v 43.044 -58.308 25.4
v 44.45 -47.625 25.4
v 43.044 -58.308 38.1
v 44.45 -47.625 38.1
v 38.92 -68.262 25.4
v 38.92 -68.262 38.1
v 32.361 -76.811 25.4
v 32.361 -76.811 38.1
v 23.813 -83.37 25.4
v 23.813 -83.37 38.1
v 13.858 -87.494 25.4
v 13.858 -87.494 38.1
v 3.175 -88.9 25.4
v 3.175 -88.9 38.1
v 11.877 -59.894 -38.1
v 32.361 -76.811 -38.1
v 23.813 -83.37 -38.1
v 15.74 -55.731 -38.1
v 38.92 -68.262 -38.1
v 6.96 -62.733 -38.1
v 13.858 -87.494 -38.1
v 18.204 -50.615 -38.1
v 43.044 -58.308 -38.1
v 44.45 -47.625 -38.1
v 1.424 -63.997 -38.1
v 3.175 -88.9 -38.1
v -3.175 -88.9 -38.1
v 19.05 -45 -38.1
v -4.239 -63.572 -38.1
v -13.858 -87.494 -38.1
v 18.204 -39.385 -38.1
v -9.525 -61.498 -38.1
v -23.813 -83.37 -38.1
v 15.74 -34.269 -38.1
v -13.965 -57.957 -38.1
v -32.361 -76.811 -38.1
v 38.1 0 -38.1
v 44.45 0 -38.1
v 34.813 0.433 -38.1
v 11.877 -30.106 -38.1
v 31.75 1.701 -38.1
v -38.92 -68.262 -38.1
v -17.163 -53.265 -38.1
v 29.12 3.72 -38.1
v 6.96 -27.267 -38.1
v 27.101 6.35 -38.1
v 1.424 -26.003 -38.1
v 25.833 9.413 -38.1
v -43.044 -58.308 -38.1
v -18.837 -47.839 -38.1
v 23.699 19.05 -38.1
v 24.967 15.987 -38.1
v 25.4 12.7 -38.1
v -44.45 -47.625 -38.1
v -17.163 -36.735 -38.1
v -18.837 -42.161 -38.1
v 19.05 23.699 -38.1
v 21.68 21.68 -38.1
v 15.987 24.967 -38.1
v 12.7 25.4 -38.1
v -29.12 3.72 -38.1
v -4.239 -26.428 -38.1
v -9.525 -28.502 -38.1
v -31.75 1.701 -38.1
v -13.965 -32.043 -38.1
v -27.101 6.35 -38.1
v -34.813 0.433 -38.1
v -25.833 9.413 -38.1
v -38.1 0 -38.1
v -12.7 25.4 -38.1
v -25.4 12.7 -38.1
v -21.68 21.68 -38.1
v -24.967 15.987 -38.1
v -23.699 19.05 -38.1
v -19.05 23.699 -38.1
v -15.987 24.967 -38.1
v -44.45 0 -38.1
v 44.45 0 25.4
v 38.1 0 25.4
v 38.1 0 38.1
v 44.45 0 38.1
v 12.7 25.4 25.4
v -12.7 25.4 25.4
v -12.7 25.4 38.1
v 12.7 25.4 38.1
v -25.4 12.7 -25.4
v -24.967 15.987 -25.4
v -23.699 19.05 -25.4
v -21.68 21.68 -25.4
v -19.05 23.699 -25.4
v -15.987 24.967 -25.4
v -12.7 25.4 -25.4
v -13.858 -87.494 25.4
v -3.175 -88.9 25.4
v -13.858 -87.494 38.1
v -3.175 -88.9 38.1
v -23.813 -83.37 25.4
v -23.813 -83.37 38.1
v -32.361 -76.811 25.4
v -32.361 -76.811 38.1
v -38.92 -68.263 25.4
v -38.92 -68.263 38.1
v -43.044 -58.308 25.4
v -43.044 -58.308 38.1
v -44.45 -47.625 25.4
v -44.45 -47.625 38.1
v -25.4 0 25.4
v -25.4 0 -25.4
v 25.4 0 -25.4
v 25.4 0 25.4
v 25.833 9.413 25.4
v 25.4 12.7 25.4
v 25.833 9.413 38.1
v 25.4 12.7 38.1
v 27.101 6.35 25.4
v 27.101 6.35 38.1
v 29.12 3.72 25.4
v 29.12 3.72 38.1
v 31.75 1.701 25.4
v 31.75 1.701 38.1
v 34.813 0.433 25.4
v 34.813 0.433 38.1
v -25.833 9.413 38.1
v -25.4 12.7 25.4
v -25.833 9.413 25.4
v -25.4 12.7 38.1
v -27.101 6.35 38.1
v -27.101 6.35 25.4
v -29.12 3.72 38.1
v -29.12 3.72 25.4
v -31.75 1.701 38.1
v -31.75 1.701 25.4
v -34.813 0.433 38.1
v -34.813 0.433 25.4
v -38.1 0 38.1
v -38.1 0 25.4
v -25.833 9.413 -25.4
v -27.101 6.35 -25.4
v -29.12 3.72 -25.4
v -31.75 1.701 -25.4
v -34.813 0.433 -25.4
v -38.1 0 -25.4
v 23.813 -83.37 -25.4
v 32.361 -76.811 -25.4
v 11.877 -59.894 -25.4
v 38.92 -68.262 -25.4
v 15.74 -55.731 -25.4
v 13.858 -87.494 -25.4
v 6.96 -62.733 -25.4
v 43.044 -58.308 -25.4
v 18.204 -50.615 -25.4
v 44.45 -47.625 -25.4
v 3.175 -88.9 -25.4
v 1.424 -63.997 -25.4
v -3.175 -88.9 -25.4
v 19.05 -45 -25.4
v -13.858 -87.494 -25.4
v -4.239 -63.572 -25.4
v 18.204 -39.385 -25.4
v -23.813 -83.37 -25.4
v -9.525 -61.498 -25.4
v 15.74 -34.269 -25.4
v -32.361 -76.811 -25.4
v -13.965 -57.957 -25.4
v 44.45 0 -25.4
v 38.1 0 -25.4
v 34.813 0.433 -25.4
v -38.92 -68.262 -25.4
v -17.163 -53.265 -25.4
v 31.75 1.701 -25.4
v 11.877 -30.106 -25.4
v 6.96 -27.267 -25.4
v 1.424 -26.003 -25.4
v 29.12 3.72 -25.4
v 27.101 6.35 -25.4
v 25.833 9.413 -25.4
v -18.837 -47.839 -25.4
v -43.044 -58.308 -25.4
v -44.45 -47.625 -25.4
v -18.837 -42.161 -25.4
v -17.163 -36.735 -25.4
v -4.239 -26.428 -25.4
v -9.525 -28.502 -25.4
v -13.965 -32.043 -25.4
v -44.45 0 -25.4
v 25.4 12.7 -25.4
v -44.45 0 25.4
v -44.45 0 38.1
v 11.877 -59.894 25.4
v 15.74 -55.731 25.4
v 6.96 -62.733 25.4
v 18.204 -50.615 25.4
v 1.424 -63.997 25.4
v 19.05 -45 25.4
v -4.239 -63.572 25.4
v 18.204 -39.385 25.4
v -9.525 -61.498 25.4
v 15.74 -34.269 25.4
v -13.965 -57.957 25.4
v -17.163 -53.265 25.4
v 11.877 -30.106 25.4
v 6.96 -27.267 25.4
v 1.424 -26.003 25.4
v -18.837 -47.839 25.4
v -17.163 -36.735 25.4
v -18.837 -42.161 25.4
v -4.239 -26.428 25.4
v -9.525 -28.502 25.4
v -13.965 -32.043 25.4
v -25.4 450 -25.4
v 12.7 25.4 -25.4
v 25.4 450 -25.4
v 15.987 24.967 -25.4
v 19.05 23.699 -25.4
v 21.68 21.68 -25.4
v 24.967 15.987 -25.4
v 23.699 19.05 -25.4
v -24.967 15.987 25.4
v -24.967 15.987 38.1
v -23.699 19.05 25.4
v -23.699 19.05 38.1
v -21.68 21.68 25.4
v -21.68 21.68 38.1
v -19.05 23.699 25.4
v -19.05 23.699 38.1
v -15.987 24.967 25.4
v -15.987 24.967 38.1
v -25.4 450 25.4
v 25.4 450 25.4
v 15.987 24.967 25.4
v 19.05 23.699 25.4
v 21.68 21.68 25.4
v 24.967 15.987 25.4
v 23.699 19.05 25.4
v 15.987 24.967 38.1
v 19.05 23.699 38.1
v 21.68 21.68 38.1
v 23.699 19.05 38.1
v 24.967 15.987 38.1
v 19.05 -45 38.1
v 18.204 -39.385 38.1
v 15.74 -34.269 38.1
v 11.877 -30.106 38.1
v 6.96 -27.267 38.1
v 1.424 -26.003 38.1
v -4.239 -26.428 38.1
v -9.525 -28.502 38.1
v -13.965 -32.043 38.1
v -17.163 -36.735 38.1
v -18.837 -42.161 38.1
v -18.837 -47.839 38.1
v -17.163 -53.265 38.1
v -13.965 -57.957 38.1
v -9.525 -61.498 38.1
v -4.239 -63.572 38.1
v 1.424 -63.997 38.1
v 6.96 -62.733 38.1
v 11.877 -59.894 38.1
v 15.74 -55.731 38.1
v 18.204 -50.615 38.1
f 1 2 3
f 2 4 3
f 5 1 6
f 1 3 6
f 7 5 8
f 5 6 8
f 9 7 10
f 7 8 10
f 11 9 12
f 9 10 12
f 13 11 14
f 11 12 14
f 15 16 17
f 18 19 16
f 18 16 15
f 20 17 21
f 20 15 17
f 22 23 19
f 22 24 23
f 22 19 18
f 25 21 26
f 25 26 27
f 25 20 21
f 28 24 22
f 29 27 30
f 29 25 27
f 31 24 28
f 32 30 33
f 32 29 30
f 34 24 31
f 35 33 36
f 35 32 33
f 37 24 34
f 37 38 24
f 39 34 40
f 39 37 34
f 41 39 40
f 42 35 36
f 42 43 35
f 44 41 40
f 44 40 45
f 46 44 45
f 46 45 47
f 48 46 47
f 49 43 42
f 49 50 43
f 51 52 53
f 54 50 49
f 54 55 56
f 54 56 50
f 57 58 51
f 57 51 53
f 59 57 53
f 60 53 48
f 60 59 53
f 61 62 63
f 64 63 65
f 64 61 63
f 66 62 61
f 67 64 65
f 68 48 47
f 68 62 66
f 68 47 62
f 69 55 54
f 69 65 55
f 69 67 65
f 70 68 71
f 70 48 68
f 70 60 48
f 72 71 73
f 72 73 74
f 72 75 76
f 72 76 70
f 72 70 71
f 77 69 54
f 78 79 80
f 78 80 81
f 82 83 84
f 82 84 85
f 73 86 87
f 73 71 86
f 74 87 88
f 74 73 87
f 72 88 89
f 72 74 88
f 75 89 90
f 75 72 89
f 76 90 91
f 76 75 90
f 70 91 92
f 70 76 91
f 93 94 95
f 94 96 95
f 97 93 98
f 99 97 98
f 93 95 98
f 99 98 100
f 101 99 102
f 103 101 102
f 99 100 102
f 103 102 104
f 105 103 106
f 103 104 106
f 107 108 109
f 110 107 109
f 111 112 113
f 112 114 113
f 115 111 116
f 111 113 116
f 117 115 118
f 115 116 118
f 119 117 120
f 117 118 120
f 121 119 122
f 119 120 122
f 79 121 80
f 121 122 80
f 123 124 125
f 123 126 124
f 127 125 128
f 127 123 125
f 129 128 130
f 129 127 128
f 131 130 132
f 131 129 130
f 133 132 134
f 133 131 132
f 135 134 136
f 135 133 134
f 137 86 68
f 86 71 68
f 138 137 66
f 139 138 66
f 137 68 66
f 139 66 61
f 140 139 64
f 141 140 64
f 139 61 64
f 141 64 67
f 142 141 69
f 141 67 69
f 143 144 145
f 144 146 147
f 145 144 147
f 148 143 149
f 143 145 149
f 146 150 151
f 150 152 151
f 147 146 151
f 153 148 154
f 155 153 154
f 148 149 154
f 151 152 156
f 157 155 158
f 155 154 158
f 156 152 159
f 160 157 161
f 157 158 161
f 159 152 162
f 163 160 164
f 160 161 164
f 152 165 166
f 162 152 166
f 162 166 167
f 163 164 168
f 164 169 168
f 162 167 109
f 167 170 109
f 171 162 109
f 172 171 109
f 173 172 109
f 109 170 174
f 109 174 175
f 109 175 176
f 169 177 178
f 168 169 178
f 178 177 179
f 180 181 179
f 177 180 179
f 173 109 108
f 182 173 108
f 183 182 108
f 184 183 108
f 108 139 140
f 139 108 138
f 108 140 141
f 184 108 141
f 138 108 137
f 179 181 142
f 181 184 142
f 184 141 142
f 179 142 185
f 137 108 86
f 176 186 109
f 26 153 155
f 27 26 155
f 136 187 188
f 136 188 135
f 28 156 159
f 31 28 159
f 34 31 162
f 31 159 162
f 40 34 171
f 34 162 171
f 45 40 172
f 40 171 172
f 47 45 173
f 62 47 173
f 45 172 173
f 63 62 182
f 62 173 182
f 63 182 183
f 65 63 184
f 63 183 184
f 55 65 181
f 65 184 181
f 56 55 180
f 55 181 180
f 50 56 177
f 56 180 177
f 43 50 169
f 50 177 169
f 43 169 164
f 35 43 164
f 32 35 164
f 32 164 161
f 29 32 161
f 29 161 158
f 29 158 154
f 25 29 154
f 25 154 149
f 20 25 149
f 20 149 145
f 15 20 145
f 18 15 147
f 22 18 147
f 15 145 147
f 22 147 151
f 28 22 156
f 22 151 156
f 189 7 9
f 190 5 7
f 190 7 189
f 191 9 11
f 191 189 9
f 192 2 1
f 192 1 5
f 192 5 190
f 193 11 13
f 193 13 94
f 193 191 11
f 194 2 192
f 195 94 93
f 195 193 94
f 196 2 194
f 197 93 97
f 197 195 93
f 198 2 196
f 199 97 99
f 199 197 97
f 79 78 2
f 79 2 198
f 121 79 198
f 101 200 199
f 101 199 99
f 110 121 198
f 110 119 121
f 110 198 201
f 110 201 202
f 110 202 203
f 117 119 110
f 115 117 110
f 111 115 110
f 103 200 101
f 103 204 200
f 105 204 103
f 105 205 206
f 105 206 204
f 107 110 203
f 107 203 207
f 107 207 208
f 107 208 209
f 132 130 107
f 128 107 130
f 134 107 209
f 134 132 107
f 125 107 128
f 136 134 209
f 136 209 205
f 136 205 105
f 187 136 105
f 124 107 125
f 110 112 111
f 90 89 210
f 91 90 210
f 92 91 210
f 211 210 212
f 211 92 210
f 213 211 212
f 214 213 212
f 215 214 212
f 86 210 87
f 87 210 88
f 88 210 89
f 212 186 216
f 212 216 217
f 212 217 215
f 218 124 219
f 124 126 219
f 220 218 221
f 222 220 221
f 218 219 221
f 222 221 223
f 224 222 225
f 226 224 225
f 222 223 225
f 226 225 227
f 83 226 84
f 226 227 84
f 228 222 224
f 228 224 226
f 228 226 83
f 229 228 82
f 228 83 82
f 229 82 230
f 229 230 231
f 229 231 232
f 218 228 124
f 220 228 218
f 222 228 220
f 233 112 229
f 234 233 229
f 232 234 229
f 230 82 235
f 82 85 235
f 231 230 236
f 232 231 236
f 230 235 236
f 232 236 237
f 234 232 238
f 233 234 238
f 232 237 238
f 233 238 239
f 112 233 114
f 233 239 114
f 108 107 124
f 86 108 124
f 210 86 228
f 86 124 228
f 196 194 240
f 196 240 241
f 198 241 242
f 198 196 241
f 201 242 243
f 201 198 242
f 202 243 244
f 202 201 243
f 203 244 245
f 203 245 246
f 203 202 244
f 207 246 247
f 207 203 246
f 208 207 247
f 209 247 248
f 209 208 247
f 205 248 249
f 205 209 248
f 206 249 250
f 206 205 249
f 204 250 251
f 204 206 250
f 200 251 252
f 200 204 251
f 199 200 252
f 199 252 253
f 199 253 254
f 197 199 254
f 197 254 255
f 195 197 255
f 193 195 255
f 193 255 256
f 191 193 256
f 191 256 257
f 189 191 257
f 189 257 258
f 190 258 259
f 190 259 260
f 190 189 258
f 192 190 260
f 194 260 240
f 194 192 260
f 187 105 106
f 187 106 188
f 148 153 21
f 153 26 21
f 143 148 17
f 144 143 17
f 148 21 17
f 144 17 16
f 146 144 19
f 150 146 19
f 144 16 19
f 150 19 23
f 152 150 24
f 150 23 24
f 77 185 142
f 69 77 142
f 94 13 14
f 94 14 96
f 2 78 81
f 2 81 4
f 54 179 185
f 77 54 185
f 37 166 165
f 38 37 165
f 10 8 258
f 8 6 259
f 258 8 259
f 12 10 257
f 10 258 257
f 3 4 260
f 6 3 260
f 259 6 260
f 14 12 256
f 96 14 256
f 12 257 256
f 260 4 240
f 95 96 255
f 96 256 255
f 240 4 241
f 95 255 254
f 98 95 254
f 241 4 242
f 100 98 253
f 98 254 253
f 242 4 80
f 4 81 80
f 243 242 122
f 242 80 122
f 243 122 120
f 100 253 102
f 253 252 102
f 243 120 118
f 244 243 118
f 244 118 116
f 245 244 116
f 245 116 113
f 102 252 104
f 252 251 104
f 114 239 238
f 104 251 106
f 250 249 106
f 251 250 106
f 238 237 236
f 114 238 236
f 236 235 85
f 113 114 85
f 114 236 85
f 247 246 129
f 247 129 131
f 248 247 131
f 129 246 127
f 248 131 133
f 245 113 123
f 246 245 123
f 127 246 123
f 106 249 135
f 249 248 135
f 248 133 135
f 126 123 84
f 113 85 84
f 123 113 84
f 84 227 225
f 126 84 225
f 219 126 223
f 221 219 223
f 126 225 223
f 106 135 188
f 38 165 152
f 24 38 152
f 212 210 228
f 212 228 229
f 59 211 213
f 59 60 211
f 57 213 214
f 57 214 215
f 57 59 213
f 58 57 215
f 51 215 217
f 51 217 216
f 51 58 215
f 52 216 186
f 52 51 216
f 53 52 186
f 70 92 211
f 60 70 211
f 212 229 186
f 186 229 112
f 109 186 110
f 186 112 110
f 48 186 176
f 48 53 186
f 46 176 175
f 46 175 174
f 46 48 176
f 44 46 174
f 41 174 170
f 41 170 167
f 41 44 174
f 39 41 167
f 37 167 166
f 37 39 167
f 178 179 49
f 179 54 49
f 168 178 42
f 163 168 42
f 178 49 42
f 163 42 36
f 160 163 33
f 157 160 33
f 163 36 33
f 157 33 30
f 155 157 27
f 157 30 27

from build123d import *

# Parameters (mm, degrees)
SKETCH1_W           = 50.8
SKETCH1_H           = 50.8
BOSS_EXTRUDE1_DEPTH = 450
SKETCH3_R           = 19.05
BOSS_EXTRUDE2_DEPTH = 12.7
FILLET1_R           = 12.7
FILLET3_R           = 41.275


with BuildPart() as part:
    # Sketch1 → Boss-Extrude1 (new body)
    with BuildSketch(Plane(origin=(0, 0, 0), x_dir=(1, 0, 0), z_dir=(0, 1, 0))):
        Rectangle(SKETCH1_W, SKETCH1_H)
    extrude(amount=BOSS_EXTRUDE1_DEPTH)

    # Sketch3 → Boss-Extrude2 (add)
    with BuildSketch(Plane.XY.offset(25.4)):
        Polygon((-25.4, 0), (-25.4, 25.4), (25.4, 25.4), (25.4, 0), (44.45, 0), (44.45, -88.9), (-44.45, -88.9), (-44.45, 0), align=None)
        with Locations((0, -45)):
            Circle(SKETCH3_R, mode=Mode.SUBTRACT)
    boss_extrude2 = extrude(amount=BOSS_EXTRUDE2_DEPTH)

    # Mirror1: Boss-Extrude2 across plane
    add(boss_extrude2.mirror(Plane.XY))

    # Fillet1
    fillet1_edges = [part.edges().sort_by_distance(p)[0] for p in [
        (25.4, 0, 31.75),
        (25.4, 0, -31.75),
        (-25.4, 0, -31.75),
        (-25.4, 0, 31.75),
    ]]
    fillet(fillet1_edges, radius=FILLET1_R)
    fillet1_2_edges = [part.edges().sort_by_distance(p)[0] for p in [
        (25.4, 25.4, -31.75),
        (-25.4, 25.4, -31.75),
        (25.4, 25.4, 31.75),
        (-25.4, 25.4, 31.75),
    ]]
    fillet(fillet1_2_edges, radius=FILLET1_R - 0.0001)  # a hair under: the kernel refuses the full size

    # Fillet3
    fillet3_edges = [part.edges().sort_by_distance(p)[0] for p in [
        (-44.45, -88.9, 31.75),
        (44.45, -88.9, 31.75),
        (-44.45, -88.9, -31.75),
        (44.45, -88.9, -31.75),
    ]]
    fillet(fillet3_edges, radius=FILLET3_R)


solid = part.part
